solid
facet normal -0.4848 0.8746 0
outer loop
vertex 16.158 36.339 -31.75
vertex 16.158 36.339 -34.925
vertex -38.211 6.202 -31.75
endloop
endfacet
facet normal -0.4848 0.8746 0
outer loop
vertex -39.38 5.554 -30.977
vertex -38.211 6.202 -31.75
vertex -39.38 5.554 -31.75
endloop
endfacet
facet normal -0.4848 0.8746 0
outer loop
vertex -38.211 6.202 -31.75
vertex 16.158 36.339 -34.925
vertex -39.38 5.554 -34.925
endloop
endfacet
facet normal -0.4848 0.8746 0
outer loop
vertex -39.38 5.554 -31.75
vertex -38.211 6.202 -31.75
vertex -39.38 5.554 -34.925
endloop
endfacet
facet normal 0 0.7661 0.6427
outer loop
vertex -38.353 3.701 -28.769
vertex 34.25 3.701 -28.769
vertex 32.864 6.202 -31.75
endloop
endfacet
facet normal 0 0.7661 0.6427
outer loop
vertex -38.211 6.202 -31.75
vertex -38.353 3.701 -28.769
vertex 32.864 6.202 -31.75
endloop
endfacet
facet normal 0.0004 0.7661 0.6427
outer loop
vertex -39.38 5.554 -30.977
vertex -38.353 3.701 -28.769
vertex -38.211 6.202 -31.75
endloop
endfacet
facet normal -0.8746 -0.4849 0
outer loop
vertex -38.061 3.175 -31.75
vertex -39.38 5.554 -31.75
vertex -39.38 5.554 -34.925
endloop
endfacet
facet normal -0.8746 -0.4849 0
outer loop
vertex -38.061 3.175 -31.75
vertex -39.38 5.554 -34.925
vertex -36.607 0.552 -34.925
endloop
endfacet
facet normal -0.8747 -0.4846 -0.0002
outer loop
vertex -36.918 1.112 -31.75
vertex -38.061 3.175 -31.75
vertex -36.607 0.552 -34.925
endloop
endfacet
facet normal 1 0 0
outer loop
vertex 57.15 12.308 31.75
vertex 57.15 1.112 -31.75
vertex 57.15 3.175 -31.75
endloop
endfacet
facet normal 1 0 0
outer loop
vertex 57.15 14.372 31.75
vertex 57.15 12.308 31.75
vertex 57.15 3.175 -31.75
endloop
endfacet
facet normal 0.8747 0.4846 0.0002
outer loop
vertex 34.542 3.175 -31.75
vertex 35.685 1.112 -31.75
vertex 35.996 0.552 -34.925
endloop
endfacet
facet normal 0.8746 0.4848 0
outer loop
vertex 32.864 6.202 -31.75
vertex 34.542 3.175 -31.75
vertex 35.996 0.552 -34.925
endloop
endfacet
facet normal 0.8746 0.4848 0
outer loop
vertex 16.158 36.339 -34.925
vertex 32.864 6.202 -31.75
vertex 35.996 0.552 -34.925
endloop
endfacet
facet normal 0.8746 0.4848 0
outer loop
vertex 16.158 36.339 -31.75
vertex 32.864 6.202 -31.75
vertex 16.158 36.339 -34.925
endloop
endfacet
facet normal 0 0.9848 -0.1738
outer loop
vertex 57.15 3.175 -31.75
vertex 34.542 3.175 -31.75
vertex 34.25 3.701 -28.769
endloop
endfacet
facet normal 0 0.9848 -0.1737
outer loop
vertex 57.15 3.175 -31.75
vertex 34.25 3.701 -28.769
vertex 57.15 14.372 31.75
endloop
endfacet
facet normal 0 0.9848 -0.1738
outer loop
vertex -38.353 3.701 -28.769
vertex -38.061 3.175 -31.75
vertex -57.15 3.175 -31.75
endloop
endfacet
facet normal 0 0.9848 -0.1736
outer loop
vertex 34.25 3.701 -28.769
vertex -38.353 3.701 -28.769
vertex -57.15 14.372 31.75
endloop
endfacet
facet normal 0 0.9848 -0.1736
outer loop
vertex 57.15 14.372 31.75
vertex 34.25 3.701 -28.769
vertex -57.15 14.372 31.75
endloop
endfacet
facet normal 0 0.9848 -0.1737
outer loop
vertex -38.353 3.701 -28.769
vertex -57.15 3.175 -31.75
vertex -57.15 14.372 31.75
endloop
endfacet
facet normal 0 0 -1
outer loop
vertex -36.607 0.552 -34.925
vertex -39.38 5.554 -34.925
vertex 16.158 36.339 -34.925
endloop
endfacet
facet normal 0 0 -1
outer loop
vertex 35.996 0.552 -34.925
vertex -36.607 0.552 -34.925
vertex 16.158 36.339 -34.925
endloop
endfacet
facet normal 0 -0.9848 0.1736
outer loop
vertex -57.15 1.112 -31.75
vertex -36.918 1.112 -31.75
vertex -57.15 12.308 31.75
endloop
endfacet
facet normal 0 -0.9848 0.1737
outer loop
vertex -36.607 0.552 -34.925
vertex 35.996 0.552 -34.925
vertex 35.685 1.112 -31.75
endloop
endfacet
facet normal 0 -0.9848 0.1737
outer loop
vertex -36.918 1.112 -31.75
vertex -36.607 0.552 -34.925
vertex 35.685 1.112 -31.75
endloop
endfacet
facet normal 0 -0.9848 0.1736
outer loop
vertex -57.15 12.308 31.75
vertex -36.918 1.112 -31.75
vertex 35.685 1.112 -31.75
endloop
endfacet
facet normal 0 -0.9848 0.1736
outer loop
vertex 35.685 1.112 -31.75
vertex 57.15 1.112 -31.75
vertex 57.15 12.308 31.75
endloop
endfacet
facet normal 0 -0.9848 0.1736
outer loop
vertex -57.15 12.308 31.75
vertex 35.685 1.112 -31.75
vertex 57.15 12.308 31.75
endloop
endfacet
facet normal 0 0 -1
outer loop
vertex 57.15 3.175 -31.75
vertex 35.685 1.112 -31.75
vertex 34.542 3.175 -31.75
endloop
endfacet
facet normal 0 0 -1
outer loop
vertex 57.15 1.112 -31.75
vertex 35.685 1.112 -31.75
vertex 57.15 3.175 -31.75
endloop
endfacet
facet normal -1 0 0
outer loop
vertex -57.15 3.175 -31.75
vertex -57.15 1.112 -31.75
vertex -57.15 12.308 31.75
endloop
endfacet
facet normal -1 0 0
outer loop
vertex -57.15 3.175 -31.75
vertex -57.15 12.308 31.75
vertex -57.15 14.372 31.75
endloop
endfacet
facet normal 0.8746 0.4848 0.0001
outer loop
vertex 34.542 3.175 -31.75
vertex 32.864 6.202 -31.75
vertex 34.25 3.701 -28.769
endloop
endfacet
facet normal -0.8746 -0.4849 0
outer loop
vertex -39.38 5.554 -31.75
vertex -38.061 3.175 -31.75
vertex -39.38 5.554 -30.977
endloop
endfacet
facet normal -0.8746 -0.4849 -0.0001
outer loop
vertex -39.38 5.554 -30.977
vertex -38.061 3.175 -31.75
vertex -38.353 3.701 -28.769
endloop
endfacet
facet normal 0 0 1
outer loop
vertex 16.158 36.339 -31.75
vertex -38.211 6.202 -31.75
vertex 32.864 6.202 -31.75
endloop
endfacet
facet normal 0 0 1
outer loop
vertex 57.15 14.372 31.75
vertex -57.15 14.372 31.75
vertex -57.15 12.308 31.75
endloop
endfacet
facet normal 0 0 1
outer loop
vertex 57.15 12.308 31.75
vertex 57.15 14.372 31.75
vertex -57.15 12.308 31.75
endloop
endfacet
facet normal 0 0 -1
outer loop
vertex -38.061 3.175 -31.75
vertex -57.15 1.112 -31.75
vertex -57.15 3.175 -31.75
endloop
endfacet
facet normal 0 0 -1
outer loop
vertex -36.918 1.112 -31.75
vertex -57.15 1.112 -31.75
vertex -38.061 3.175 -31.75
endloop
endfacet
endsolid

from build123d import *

# Parameters (mm, degrees)
SKETCH1_W           = 114.3
SKETCH1_H           = 63.5
BOSS_EXTRUDE1_DEPTH = 3.175
BOSS_EXTRUDE2_DEPTH = 3.175
BOSS_EXTRUDE3_START = -57.15
BOSS_EXTRUDE3_DEPTH = 114.3
CUT_EXTRUDE1_DEPTH  = 125.91911954
CHAMFER1_SIZE       = 2.54


# Read off the part's stored shape, not the designer's step: Boss-Extrude3
with BuildPart() as part:
    # Sketch1 → Boss-Extrude1 (new body)
    with BuildSketch(Plane(origin=(0, 0, 0), x_dir=(1, 0, 0), z_dir=(0, 1, 0))):
        Rectangle(SKETCH1_W, SKETCH1_H)
    extrude(amount=BOSS_EXTRUDE1_DEPTH)

    # Sketch2 → Boss-Extrude2 (add)
    with BuildSketch(Plane(origin=(0, 0, -31.75), x_dir=(-1, 0, 0), z_dir=(0, 0, -1))):
        Polygon((-16.15831866, 36.339246026), (39.380032744, 5.55383514), (36.301491655, 0), (-36.301491655, 0), align=None)
    extrude(amount=BOSS_EXTRUDE2_DEPTH)

    # Boss-Extrude3 outline → Boss-Extrude3 (add)
    with BuildSketch(Plane.YZ.offset(BOSS_EXTRUDE3_START)):
        Polygon((14.371763275, 31.75), (3.175, 31.75), (3.175, -31.75), align=None)
    extrude(amount=BOSS_EXTRUDE3_DEPTH)

    # Sketch4 → Cut-Extrude1 (cut, through all)
    with BuildSketch(Plane(origin=(57.15, 0, 0), x_dir=(0, 0, -1), z_dir=(1, 0, 0))):
        Polygon((-31.75, 12.3084164), (-31.75, 0), (34.925, 0), (34.925, 0.551814961), align=None)
    extrude(amount=-CUT_EXTRUDE1_DEPTH, mode=Mode.SUBTRACT)

    # Chamfer1
    # the kernel refuses this chamfer: 2.54 mm, written as the material it adds along each edge
    with BuildSketch(Plane(origin=(-45.794774456, 3.175, -31.75), x_dir=(0, 0.14881491150796153, 0.988865067697751), z_dir=(1, 0, 0))) as chamfer1_piece_1_section:
        Polygon((CHAMFER1_SIZE * 1.19137631147, -CHAMFER1_SIZE * 0.0299851619673), (CHAMFER1_SIZE * 0.177350705421, -CHAMFER1_SIZE * 1.17848349702), (0, 0), align=None)
    chamfer1_piece_1 = extrude(amount=88.069686436, mode=Mode.PRIVATE)
    chamfer1_piece_1 = split(chamfer1_piece_1, bisect_by=Plane(origin=(-30.181920022, -11.039999469, -30.75599928), z_dir=(0.8746197071393951, 0.48480962024633845, 0)), keep=Keep.TOP, mode=Mode.PRIVATE)
    chamfer1_piece_1 = split(chamfer1_piece_1, bisect_by=Plane(origin=(25.356431382, 19.745411417, -30.75599928), z_dir=(-0.8746197071393954, -0.4848096202463377, 0)), keep=Keep.TOP, mode=Mode.PRIVATE)
    chamfer1_piece_1 = split(chamfer1_piece_1, bisect_by=Plane(origin=(-11.60015099, 20.952475045, -30.75599928), z_dir=(0.4848096202463377, -0.8746197071393954, 0)), keep=Keep.TOP, mode=Mode.PRIVATE)
    add(chamfer1_piece_1)


solid = part.part
